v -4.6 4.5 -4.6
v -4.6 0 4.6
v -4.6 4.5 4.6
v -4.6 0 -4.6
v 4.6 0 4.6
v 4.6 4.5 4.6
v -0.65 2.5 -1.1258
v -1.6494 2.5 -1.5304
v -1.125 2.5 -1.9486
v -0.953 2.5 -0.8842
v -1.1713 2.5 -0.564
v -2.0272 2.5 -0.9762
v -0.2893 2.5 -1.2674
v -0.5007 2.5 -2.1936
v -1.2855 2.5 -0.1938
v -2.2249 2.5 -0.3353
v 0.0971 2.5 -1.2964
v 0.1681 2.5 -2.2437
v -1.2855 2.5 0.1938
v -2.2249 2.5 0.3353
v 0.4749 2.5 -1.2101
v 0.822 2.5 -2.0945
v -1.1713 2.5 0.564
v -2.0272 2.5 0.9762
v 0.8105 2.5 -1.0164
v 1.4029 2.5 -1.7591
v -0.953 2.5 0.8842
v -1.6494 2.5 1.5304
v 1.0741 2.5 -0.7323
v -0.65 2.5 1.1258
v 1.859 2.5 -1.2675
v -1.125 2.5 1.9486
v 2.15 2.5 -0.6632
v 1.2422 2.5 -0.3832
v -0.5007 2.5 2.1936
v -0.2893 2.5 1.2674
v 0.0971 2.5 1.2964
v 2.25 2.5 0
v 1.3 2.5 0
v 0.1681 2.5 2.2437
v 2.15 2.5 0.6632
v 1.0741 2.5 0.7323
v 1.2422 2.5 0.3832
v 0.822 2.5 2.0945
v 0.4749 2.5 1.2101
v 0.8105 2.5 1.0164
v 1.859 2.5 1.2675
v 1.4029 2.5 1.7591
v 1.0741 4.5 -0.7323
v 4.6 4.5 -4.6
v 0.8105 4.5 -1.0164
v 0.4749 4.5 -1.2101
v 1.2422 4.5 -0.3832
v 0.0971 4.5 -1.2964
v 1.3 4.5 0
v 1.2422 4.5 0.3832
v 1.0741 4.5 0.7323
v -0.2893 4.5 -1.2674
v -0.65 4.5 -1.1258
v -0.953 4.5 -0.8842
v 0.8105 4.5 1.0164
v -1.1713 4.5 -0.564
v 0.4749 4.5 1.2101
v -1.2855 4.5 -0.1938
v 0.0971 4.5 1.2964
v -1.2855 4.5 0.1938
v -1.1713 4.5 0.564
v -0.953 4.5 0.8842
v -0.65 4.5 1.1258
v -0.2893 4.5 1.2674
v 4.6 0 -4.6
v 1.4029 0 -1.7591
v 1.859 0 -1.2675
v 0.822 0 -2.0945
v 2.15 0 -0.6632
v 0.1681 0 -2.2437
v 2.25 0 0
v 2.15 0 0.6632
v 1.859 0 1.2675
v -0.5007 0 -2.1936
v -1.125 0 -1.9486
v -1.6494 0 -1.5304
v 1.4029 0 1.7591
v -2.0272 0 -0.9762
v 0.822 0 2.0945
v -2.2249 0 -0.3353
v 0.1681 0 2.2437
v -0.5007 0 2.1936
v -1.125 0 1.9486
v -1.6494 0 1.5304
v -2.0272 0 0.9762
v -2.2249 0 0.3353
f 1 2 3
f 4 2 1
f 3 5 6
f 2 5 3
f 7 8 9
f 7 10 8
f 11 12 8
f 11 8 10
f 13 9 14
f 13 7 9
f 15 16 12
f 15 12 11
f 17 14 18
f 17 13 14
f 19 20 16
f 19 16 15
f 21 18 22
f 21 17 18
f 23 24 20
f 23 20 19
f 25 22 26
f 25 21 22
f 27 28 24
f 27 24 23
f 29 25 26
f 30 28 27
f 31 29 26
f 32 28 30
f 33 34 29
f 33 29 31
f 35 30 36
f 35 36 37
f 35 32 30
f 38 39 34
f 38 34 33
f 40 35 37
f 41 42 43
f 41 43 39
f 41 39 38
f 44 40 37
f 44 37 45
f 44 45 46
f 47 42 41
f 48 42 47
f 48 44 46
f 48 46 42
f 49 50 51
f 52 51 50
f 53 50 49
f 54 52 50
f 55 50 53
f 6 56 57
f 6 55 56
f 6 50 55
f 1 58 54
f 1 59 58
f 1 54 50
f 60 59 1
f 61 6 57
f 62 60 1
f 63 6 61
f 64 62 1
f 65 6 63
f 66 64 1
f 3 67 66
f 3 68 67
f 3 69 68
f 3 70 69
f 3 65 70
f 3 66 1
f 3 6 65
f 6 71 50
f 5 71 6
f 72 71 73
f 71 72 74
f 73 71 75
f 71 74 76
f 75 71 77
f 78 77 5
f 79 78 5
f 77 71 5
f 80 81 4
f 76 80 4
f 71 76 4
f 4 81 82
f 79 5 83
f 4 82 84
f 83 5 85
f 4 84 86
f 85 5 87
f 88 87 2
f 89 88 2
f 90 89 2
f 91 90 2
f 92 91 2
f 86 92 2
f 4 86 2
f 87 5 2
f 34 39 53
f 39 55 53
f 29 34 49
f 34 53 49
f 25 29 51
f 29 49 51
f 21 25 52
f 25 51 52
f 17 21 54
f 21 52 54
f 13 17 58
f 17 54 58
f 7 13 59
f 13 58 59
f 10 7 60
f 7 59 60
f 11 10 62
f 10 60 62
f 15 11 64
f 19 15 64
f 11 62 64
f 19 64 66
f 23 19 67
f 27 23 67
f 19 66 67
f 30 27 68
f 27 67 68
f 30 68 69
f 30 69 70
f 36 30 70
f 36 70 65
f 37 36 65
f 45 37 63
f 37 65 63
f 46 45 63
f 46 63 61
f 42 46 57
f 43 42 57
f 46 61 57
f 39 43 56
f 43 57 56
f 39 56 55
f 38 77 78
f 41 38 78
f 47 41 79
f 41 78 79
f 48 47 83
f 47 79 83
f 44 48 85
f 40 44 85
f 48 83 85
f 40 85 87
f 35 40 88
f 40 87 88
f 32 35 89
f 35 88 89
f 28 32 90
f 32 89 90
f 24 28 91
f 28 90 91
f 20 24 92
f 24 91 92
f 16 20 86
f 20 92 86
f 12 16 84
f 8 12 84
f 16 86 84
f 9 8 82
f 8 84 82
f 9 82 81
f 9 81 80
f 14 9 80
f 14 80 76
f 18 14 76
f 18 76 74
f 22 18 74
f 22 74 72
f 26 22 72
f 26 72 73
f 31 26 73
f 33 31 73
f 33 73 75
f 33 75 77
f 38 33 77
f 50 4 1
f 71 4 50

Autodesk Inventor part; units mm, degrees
ref_plane "YZ Plane" through (0, 0, 0) normal (1, 0, 0) x (0, 1, 0)
ref_plane "XZ Plane" through (0, 0, 0) normal (0, 1, 0) x (-1, 0, 0)
ref_plane "XY Plane" through (0, 0, 0) normal (0, 0, 1) x (1, 0, 0)
sketch "Sketch1" plane through (0, 0, 0) normal (0, 1, 0) x (-1, 0, 0)
  line L0 (-4.6, 4.6) -> (4.6, 4.6)
  line L1 (4.6, 4.6) -> (4.6, -4.6)
  line L2 (4.6, -4.6) -> (-4.6, -4.6)
  line L3 (-4.6, -4.6) -> (-4.6, 4.6)
  point P0 (0, 0)
  dimension "d0" = 9.2
  dimension "d1" = 9.2
  dimension "d2" = 4.6
  dimension "d3" = 4.6
extrude "Extrusion1" add sketch "Sketch1" along normal blind 4.5
sketch "Sketch3" plane through (0, 0, 0) normal (0, -1, 0) x (1, 0, 0)
  line L0 (-4.6, 4.6) -> (4.6, -4.6) construction
  line L1 (4.6, 4.6) -> (-4.6, -4.6) construction
  circle A0 centre (0, 0) radius 2.25
  point P0 (0, 0)
  point P1 (0, 0)
  dimension "d13" = 4.5
sketch "Sketch4" plane through (0, 4.5, 0) normal (0, 1, 0) x (1, 0, 0)
  circle A0 centre (0, 0) radius 1.3
  dimension "d10" = 2.6
extrude "Extrusion3" cut sketch "Sketch4" against normal blind 2
extrude "Extrusion4" cut sketch "Sketch3" against normal blind 2.5
equation "\"d0\" = 2 * BoltTrace"
equation "\"d1\" = d0"
equation "\"d2\" = 0.5 * d1"
equation "\"d3\" = 0.5 * d0"
equation "\"d4\" = ClassicThickness"
equation "\"d13\" = ServoHeadScrewTrace"
equation "\"d10\" = ServoScrewDiameterRequired"
equation "\"d11\" = MinimalThickness"
equation "\"d14\" = ServoHeadScrewThickness"
equation "\"BoltTrace\" = 4.6"
equation "\"ClassicThickness\" = 4.5"
equation "\"ServoHeadScrewTrace\" = 4.5"
equation "\"ServoScrewDiameterRequired\" = 2.6"
equation "\"MinimalThickness\" = 2"
equation "\"ServoHeadScrewThickness\" = 2.5"
properties part number "ClassicScrewHeadTrace"
